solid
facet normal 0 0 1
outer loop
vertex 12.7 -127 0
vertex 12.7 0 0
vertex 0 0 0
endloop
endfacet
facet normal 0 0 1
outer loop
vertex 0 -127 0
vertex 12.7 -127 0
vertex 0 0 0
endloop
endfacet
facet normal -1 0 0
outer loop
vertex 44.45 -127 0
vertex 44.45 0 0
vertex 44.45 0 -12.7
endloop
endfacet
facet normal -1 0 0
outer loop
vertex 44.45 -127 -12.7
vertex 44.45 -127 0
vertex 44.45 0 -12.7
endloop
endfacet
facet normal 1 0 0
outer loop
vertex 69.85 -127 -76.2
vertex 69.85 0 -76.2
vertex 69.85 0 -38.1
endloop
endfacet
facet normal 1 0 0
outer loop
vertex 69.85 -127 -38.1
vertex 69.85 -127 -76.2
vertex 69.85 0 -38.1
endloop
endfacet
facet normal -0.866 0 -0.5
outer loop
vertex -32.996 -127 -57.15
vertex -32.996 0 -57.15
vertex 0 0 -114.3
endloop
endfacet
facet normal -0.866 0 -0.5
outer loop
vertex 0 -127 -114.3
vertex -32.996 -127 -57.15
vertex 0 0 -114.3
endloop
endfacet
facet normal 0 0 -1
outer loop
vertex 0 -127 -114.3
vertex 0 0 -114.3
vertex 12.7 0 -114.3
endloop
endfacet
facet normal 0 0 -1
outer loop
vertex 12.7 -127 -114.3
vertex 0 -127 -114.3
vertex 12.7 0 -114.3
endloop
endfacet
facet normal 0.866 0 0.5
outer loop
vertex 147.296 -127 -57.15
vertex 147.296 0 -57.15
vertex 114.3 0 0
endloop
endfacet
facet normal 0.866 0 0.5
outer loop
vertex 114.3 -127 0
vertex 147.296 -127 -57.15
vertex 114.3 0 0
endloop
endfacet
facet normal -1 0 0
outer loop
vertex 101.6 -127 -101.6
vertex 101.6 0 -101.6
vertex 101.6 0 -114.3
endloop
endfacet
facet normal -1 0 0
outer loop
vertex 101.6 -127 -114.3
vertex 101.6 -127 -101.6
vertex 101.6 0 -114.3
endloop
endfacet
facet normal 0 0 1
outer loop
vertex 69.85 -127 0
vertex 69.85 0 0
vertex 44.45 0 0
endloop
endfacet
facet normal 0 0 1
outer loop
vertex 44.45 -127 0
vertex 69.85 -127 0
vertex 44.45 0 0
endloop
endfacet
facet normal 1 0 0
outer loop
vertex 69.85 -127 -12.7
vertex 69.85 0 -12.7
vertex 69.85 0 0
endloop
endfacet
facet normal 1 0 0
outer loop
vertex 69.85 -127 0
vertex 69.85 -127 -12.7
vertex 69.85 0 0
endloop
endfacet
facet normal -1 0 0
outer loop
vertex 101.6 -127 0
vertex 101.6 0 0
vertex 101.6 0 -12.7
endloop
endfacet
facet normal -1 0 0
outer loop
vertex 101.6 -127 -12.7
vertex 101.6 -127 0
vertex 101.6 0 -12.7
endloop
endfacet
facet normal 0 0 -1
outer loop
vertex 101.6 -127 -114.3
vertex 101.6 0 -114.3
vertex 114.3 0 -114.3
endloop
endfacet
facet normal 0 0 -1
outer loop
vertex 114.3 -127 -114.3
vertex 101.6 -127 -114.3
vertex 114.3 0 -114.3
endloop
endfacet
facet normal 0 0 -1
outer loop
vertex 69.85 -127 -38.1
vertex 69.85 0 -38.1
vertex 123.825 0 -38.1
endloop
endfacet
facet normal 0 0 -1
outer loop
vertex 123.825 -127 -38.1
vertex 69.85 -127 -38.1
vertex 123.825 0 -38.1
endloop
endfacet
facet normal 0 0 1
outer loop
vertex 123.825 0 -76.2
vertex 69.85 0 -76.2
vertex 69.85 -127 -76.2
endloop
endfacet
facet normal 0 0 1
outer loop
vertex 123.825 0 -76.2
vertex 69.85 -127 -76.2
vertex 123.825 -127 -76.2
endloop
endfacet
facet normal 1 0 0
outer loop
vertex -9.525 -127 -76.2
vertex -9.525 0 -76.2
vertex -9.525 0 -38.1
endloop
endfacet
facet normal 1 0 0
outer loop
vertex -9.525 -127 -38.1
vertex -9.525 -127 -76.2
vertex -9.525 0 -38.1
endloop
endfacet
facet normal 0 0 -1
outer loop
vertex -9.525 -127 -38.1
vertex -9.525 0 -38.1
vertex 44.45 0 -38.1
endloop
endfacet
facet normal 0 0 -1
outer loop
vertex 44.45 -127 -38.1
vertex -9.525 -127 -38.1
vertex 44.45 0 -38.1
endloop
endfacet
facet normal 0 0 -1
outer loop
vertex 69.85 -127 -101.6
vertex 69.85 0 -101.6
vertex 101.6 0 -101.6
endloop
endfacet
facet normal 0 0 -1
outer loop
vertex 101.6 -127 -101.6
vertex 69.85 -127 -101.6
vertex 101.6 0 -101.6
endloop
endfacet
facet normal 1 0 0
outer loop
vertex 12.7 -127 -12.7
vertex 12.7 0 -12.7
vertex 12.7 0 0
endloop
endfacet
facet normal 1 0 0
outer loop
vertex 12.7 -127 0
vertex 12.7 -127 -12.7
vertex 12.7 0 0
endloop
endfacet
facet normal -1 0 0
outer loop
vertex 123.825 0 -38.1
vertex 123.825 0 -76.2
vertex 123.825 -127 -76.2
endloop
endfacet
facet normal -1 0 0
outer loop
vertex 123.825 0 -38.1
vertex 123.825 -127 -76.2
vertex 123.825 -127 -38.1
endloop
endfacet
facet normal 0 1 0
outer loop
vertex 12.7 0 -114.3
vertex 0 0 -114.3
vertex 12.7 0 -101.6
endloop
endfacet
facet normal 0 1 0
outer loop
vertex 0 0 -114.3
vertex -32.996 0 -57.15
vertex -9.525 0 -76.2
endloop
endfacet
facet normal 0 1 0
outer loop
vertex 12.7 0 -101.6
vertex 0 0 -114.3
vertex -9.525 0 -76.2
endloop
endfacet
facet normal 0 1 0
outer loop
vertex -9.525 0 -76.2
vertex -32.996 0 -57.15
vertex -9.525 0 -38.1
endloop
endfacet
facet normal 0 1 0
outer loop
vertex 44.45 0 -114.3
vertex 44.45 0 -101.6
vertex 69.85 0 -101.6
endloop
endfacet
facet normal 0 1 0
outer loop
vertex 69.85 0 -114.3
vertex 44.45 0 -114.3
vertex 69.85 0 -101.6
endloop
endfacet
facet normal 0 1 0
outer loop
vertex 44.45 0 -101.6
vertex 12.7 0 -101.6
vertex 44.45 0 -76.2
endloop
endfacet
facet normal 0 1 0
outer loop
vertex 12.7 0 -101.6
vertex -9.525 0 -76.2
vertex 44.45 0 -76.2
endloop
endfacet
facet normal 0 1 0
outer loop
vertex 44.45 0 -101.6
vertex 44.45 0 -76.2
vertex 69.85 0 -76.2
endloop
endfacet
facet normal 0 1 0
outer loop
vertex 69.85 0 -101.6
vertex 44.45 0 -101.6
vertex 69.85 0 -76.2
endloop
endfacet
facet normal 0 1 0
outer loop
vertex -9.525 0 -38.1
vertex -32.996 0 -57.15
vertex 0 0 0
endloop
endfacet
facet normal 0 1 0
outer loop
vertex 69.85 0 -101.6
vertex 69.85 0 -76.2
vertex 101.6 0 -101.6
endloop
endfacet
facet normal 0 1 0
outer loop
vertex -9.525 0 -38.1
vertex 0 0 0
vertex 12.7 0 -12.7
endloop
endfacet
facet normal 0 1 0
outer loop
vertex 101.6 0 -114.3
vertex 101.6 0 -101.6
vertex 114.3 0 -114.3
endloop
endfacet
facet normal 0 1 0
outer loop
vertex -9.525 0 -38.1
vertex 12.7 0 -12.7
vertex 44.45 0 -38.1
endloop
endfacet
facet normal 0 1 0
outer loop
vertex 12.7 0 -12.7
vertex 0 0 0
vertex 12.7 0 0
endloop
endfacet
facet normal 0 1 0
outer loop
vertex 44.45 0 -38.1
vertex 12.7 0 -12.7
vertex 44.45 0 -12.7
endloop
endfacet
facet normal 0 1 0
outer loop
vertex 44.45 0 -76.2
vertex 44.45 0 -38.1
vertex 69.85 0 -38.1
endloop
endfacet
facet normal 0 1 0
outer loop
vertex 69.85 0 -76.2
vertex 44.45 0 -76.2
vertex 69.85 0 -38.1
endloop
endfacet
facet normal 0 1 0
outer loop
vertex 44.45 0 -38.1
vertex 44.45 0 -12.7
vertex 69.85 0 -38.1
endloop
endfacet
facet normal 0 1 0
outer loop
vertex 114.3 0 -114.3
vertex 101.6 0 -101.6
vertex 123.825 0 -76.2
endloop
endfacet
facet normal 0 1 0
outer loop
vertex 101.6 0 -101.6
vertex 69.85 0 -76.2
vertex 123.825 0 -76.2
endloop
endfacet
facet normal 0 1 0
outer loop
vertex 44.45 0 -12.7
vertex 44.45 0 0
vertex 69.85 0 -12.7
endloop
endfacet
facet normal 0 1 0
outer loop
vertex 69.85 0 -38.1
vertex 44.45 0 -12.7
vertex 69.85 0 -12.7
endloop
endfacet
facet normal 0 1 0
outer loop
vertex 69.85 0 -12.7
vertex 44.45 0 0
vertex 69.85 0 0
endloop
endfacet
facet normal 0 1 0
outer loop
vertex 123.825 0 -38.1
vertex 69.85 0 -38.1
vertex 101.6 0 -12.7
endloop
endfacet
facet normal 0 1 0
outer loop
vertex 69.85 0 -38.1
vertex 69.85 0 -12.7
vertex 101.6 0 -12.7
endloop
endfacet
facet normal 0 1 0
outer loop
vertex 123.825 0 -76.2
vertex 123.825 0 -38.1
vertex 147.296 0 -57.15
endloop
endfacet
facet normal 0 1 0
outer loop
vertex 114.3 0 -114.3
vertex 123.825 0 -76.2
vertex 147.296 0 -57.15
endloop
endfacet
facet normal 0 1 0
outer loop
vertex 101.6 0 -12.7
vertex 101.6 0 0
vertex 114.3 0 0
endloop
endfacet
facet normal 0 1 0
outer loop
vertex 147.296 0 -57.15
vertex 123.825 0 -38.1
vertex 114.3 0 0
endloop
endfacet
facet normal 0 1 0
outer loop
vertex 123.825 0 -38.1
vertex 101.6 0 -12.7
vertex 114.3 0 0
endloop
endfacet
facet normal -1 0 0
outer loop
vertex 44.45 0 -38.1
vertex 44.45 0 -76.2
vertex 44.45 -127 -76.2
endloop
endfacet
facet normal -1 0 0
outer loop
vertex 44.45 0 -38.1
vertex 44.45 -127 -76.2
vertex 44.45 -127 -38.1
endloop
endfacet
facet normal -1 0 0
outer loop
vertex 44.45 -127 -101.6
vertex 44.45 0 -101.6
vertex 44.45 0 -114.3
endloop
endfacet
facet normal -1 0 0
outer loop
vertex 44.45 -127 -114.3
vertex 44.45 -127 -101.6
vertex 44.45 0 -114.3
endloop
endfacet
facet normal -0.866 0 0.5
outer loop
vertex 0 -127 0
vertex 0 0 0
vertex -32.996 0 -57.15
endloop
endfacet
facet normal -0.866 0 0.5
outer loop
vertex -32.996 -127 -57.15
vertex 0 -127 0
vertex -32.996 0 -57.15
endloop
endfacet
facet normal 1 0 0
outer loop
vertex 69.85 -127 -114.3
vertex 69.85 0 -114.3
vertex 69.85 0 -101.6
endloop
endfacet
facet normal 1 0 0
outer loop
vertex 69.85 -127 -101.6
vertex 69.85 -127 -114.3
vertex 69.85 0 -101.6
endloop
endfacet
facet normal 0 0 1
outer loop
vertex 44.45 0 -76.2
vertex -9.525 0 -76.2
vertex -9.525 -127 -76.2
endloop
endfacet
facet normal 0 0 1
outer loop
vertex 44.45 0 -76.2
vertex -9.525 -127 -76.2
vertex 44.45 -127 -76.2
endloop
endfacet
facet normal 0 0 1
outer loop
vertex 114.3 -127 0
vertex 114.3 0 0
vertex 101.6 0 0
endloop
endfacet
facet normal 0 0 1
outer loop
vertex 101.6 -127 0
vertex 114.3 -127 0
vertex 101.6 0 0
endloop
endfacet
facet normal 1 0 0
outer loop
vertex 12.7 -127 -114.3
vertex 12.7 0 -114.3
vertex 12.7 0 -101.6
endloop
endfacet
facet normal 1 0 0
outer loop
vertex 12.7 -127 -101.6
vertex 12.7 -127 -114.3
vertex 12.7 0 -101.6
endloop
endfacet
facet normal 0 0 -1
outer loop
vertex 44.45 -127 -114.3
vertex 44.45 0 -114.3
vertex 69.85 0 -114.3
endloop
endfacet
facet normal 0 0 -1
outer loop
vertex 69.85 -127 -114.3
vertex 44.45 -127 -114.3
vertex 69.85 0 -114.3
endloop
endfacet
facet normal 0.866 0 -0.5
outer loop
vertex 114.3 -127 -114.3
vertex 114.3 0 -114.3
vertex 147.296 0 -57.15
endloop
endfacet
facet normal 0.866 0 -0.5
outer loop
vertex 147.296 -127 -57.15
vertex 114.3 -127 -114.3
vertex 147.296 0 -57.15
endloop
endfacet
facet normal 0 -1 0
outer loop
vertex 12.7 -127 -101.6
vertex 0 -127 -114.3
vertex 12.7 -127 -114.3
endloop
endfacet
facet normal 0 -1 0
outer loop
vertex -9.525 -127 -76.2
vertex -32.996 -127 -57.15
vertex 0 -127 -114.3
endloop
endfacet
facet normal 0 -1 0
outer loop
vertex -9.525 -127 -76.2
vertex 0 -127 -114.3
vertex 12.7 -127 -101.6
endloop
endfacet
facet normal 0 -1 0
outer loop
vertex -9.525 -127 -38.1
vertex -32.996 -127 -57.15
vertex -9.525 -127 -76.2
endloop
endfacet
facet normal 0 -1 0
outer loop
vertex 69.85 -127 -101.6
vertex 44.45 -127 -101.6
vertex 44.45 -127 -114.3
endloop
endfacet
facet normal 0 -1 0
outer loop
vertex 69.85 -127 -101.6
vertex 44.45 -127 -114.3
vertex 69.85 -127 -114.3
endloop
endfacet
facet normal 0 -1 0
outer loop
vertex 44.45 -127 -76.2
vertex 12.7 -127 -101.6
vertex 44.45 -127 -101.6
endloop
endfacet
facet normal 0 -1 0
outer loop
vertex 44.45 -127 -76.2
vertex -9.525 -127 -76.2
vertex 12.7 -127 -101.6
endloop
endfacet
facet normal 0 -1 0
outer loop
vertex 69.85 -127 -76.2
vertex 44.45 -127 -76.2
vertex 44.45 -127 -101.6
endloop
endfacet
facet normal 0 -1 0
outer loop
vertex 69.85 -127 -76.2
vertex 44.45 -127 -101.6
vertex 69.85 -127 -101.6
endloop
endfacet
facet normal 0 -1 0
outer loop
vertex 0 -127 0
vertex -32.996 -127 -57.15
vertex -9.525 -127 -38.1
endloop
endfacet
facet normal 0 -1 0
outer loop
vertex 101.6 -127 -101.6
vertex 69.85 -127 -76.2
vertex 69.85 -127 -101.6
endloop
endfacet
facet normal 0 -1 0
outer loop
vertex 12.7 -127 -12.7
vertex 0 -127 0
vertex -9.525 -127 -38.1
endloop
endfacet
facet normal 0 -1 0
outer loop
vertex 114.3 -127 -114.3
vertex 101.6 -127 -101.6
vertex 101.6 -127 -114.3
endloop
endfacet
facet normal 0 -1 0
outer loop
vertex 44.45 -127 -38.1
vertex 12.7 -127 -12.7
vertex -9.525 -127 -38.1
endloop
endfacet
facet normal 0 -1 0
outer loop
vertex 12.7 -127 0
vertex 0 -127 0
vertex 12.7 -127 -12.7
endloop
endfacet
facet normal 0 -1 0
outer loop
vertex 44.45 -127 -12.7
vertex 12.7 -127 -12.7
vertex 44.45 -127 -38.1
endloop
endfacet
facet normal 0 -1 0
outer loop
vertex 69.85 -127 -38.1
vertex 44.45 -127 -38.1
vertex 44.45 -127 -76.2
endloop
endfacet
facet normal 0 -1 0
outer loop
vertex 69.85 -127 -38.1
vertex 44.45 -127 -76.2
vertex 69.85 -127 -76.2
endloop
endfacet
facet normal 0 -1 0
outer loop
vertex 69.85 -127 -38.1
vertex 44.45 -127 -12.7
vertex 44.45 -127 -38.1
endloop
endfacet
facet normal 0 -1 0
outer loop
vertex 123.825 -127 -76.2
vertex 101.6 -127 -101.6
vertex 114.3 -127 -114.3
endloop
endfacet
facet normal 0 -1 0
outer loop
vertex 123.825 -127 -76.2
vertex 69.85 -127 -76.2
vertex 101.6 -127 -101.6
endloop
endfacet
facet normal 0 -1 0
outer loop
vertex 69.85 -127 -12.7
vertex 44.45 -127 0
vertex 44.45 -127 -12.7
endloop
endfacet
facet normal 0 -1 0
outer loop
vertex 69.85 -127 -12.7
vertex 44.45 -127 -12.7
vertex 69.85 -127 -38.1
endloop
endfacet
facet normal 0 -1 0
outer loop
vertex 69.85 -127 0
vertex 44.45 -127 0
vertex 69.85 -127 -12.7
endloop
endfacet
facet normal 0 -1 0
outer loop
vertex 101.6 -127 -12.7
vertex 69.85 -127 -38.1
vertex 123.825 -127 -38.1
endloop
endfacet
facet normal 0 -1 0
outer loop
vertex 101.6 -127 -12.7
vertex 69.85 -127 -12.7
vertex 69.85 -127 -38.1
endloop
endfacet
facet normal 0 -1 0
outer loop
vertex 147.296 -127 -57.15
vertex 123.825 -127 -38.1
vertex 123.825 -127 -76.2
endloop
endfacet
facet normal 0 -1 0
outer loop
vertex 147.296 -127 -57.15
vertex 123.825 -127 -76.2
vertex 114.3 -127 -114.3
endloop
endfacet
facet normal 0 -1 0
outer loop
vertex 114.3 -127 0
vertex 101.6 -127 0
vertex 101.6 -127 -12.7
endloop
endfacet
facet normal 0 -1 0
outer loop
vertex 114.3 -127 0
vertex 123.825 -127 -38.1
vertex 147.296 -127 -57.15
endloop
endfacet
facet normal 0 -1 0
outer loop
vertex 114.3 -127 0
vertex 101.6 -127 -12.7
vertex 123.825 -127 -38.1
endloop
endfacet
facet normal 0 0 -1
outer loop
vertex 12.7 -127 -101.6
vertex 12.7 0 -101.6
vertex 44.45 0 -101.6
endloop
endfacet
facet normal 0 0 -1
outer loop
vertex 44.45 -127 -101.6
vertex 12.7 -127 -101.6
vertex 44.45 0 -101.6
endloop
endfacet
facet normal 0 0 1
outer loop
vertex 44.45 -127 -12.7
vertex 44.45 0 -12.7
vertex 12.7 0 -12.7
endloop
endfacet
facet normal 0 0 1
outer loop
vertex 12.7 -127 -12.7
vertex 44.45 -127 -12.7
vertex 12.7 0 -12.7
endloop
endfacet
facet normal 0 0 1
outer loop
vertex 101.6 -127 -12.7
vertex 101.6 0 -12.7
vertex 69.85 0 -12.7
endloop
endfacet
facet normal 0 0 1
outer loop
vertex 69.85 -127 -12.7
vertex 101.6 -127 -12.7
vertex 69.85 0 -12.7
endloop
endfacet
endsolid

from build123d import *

# Parameters (mm, degrees)
F0_W     = 53.975
F0_H     = 38.1
F1_DEPTH = 127


with BuildPart() as f1:
    # F0 (on Front) → F1 (new body)
    with BuildSketch(Plane.XZ):
        Polygon((12.7, 0), (0, 0), (-32.995568, -57.15), (0, -114.3), (12.7, -114.3), (12.7, -101.6), (44.45, -101.6), (44.45, -114.3), (69.85, -114.3), (69.85, -101.6), (101.6, -101.6), (101.6, -114.3), (114.3, -114.3), (147.295568, -57.15), (114.3, 0), (101.6, 0), (101.6, -12.7), (69.85, -12.7), (69.85, 0), (44.45, 0), (44.45, -12.7), (12.7, -12.7), align=None)
        with Locations((17.4625, -57.15)):
            Rectangle(F0_W, F0_H, mode=Mode.SUBTRACT)
        with Locations((96.8375, -57.15)):
            Rectangle(F0_W, F0_H, mode=Mode.SUBTRACT)
    extrude(amount=F1_DEPTH)


solid = f1.part
